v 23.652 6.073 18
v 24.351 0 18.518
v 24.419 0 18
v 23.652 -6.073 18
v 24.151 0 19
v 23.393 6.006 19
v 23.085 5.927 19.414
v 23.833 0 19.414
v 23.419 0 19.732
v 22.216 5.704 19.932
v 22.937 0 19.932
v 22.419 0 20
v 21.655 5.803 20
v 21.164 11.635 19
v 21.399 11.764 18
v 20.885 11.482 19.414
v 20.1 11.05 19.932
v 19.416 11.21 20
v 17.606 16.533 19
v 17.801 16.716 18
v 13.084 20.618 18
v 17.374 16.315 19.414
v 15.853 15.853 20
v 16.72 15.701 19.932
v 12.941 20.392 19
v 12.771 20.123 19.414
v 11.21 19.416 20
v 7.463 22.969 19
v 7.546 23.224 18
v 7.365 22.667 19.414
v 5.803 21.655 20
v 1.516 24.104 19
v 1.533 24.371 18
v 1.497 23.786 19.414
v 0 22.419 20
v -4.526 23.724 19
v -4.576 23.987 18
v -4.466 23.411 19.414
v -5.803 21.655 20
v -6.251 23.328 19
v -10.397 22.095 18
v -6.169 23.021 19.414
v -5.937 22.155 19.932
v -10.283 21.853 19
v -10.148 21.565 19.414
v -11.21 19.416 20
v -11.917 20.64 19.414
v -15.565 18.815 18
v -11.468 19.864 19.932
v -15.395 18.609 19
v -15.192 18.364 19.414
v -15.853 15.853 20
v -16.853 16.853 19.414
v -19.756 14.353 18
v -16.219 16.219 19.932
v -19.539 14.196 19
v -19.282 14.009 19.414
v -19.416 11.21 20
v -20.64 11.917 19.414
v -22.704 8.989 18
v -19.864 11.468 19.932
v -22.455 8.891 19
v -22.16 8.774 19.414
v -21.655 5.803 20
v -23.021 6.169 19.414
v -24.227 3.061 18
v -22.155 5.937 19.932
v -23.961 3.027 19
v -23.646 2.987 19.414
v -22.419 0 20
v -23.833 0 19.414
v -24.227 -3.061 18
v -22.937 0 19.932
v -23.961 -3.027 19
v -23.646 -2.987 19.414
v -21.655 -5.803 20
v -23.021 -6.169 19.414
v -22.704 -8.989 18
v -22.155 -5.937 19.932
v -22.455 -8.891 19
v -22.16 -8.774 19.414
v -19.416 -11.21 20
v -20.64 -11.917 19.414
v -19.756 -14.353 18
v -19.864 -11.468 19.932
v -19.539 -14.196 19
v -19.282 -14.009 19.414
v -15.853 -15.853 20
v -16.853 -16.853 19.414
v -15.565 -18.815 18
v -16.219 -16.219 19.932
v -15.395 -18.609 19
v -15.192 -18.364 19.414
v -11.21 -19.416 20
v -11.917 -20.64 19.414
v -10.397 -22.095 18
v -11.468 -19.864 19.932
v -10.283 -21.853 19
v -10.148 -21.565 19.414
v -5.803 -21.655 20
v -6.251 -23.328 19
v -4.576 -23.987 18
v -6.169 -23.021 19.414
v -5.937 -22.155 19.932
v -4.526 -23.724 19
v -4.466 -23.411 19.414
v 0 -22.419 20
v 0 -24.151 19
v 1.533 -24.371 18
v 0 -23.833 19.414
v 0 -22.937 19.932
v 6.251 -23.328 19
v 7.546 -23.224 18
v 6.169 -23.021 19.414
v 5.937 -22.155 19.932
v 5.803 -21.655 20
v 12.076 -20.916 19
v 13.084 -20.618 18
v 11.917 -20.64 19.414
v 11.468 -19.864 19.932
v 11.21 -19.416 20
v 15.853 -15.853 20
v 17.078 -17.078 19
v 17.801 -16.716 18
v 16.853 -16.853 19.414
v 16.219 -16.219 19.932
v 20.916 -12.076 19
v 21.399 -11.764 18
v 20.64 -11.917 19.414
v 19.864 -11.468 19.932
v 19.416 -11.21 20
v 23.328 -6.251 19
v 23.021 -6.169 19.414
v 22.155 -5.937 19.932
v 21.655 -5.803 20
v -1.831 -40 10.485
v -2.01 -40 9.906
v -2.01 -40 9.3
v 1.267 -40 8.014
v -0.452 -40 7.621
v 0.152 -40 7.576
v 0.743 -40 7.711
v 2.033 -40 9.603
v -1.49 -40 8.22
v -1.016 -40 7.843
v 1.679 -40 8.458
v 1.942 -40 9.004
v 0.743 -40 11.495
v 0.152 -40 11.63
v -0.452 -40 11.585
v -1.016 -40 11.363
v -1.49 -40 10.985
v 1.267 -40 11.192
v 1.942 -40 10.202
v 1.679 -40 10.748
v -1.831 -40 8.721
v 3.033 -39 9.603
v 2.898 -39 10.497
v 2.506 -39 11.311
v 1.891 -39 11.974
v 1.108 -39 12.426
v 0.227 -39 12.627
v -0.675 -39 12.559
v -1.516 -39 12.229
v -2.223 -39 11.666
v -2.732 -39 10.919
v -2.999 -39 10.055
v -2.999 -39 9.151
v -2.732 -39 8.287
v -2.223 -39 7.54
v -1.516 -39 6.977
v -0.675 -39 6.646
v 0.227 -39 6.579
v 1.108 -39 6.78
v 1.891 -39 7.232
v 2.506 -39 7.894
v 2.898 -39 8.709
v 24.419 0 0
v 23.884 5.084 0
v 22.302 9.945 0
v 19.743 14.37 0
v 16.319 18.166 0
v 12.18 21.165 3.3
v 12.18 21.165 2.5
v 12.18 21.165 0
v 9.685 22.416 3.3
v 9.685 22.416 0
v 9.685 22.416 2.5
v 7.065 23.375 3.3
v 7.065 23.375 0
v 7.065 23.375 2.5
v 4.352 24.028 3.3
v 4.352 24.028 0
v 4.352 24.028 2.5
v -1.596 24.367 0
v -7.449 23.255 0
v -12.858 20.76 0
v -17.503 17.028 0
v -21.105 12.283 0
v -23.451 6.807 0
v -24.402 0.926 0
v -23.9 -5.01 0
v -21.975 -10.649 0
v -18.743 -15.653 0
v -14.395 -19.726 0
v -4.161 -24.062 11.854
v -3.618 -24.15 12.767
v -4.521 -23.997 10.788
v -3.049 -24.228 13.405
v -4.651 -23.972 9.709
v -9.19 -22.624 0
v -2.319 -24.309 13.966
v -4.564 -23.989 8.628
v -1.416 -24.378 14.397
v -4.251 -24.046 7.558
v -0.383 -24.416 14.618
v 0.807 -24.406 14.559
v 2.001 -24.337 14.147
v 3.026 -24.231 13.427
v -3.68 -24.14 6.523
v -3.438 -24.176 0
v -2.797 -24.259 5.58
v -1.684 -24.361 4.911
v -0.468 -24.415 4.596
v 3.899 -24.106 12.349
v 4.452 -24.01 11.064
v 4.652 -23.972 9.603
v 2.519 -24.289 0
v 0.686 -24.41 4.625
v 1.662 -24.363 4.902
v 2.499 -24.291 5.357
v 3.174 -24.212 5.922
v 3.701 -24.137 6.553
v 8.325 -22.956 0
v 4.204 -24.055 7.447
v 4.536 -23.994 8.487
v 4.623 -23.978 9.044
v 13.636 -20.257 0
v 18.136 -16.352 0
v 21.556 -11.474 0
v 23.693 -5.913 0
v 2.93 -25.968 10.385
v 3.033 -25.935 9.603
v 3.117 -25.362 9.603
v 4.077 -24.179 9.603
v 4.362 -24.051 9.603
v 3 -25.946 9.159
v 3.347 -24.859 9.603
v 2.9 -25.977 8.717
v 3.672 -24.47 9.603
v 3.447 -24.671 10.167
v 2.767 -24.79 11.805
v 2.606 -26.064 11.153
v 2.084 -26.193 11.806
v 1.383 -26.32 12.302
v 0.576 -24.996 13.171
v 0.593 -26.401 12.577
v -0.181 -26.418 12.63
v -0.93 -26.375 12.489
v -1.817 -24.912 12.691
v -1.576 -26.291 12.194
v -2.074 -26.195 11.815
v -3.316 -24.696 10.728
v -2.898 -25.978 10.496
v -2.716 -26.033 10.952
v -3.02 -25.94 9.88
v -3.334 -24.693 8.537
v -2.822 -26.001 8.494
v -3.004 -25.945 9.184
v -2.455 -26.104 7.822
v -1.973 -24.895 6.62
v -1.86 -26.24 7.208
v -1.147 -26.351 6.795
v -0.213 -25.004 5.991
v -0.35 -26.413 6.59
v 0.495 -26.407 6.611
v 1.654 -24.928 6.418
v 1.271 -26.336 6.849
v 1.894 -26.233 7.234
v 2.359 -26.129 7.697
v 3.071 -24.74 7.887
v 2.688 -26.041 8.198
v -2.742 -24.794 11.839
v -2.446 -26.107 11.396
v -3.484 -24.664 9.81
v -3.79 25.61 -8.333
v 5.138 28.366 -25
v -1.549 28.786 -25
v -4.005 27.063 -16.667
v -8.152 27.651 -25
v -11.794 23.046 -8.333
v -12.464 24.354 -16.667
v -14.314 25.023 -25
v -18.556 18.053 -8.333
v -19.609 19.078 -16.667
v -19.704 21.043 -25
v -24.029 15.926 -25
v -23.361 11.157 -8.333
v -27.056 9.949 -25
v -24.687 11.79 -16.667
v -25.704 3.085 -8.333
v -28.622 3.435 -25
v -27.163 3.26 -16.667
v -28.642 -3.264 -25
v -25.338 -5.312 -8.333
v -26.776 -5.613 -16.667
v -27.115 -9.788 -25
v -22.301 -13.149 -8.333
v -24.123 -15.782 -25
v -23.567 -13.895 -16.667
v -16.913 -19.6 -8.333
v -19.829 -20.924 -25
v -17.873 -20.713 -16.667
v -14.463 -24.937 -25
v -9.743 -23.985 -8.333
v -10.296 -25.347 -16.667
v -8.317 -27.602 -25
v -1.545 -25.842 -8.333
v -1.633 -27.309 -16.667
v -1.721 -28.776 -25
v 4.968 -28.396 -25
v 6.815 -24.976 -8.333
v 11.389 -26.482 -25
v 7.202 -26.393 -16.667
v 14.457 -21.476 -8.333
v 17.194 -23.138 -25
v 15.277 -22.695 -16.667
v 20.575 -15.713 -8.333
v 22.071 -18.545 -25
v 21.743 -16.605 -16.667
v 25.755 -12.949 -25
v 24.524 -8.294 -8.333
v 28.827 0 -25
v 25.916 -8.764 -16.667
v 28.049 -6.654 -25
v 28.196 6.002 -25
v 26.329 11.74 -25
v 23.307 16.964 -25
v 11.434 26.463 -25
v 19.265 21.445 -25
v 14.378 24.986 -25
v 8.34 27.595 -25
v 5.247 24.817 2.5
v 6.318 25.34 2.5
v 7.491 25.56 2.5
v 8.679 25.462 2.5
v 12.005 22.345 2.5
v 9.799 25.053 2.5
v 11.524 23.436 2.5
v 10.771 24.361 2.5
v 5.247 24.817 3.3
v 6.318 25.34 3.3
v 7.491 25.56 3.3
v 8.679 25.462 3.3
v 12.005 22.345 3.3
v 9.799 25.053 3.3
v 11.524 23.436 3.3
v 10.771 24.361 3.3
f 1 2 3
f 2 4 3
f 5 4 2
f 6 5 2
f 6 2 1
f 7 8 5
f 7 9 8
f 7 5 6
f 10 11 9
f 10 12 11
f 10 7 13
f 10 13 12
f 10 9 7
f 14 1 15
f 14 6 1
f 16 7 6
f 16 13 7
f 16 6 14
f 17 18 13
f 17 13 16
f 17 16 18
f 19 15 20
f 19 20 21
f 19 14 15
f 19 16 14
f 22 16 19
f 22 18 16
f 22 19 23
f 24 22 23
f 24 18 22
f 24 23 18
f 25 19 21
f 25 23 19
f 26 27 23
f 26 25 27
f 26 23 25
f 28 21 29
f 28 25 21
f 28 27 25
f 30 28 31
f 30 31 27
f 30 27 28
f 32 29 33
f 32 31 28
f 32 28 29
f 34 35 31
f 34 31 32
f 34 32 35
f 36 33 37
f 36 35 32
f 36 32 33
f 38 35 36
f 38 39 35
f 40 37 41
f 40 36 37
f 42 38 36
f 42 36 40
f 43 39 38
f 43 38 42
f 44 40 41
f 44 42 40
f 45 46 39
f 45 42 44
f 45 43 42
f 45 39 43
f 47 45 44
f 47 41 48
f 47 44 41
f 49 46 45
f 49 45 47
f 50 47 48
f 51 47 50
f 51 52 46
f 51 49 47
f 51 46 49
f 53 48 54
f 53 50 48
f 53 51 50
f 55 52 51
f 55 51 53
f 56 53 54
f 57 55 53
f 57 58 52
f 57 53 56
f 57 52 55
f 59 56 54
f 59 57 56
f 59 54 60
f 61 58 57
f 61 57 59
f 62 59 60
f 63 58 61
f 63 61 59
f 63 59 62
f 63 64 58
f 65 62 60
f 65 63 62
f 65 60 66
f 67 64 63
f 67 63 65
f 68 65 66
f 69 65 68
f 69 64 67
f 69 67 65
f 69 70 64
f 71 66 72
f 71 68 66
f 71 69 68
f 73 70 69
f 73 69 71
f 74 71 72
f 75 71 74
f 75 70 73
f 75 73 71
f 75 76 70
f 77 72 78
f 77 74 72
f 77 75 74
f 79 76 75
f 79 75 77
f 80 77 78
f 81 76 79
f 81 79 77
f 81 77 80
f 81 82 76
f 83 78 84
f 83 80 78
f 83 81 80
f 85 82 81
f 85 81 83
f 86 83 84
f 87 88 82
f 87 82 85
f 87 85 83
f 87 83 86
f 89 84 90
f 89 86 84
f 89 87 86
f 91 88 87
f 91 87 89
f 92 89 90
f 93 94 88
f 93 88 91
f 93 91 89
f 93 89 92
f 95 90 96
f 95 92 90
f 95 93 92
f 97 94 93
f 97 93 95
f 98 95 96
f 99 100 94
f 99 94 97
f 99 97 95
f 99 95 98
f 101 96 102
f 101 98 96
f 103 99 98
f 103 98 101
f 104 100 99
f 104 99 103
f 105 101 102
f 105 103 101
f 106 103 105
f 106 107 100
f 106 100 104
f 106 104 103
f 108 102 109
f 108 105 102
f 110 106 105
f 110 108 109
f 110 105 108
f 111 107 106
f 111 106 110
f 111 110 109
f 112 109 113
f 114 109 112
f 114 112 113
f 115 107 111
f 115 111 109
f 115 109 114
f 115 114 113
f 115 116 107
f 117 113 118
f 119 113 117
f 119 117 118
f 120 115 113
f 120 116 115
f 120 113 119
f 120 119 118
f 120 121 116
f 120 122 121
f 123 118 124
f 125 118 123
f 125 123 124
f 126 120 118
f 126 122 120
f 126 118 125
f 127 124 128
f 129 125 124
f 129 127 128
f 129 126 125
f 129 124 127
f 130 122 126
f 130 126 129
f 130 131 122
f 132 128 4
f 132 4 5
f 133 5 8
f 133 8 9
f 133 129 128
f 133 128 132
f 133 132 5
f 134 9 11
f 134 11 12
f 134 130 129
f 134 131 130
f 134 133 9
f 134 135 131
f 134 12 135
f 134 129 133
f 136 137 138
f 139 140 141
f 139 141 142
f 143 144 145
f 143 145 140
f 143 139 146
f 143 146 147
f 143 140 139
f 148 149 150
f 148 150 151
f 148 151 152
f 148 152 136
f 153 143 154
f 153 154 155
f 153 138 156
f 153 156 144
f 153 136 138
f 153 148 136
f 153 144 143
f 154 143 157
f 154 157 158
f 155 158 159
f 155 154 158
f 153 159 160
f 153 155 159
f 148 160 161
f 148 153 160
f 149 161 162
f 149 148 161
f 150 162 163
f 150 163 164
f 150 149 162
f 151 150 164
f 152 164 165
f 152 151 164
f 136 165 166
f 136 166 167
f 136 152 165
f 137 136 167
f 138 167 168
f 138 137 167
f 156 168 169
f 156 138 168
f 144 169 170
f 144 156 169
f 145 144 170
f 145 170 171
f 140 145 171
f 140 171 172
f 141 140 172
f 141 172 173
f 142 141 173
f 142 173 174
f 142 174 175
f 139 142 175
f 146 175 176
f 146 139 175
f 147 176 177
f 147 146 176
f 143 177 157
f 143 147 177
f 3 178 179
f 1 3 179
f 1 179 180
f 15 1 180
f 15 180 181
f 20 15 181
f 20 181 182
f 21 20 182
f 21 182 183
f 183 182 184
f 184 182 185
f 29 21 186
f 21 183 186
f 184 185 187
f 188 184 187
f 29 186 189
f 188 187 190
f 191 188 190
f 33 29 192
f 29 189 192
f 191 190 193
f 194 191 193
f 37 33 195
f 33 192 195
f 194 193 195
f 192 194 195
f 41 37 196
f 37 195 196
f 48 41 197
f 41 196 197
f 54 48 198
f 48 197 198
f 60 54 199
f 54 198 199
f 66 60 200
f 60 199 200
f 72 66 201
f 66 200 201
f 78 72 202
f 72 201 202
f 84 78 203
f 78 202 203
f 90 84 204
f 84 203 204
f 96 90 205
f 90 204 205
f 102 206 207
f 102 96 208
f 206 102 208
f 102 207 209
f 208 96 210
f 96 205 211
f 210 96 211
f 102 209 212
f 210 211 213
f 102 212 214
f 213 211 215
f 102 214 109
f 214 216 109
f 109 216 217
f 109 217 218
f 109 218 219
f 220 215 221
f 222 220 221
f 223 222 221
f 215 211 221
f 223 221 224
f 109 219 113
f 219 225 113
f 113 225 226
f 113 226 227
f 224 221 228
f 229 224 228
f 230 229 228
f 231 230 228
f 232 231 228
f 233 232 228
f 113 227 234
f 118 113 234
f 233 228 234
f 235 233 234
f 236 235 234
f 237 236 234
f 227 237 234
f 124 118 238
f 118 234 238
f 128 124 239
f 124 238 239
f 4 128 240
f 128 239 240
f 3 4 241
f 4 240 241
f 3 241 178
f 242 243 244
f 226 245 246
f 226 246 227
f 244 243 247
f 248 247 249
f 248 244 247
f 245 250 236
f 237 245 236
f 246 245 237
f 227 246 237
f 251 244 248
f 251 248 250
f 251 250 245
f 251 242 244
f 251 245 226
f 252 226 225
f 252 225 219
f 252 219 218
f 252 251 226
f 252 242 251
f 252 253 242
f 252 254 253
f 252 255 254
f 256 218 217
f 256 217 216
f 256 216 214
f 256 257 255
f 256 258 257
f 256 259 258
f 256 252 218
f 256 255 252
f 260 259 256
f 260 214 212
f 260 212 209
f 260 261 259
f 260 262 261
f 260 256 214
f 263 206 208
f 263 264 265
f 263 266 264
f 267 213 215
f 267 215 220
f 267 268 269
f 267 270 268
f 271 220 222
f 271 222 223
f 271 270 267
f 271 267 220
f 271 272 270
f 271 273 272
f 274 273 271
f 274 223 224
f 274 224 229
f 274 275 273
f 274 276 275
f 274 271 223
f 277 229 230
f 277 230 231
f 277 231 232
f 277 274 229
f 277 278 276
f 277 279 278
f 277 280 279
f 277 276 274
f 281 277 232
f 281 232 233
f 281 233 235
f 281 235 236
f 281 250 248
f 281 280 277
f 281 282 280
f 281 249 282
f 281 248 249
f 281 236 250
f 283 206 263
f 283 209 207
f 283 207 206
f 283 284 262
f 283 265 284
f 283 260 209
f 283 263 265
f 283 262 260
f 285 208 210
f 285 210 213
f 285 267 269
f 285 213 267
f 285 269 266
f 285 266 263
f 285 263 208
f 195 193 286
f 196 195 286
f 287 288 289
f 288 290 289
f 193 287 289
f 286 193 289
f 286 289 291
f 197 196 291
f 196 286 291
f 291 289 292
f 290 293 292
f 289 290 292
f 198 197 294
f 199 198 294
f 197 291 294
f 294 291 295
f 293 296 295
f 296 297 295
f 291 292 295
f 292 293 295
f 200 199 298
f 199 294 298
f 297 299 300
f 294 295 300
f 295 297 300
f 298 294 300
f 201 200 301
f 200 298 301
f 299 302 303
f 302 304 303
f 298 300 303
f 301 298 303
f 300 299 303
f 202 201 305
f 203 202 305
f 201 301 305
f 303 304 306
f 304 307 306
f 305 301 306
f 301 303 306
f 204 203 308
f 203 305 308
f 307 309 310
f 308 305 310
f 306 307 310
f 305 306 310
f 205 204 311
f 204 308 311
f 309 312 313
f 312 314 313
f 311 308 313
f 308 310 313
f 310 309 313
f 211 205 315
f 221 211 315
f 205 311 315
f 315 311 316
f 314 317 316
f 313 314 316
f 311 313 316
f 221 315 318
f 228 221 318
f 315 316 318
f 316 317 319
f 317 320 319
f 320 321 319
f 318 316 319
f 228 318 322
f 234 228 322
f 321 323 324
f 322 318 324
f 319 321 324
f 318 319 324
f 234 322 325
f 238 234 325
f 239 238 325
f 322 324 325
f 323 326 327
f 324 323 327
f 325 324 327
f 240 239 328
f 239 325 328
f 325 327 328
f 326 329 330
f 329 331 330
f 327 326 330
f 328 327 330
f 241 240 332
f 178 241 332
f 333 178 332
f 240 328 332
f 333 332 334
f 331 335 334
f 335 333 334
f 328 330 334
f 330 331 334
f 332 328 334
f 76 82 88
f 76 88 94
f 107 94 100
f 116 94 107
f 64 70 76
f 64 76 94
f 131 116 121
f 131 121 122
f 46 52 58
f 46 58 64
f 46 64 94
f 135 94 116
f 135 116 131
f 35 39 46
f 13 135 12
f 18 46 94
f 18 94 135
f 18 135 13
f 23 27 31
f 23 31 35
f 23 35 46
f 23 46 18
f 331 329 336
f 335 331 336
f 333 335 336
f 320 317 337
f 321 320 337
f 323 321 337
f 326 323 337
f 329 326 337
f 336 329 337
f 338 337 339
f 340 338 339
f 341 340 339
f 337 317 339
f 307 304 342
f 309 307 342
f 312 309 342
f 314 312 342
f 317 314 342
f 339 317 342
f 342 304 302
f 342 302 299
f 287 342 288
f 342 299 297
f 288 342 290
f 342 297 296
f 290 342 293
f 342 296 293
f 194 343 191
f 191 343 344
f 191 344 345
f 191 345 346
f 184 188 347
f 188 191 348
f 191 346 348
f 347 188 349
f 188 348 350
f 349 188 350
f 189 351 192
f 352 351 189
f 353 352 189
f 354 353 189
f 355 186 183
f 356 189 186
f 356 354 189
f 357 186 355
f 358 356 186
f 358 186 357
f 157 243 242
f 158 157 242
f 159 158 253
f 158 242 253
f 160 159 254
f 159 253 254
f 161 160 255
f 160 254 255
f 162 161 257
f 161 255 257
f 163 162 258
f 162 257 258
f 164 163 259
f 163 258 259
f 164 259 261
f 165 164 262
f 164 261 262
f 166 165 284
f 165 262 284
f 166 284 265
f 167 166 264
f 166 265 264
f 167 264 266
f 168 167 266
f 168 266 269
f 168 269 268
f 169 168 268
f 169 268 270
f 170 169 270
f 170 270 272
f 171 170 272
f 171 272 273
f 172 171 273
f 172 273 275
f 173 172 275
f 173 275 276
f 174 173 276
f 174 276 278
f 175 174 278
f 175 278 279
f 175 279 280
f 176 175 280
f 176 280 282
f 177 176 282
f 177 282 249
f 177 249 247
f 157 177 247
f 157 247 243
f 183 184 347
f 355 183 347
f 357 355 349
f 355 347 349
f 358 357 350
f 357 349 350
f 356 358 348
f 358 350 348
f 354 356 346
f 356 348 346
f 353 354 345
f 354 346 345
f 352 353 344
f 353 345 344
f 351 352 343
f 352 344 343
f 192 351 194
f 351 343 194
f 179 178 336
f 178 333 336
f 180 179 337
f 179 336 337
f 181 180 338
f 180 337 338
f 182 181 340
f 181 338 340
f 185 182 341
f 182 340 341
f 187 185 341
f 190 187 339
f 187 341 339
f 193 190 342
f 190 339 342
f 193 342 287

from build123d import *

# Parameters (mm, degrees)
F0_R      = 24.4192579829
F1_DEPTH  = 20
F5_DEPTH  = 0.8
F6_R      = 3.0326267801
F7_DEPTH  = 40
F8_R      = 2
F9_SIZE   = 1
F10_DEPTH = 25
F10_TAPER = -10


with BuildPart() as f1:
    # F0 (on Top) → F1 (new body)
    with BuildSketch(Plane.XY):
        Circle(F0_R)
    extrude(amount=F1_DEPTH)

    # F4 (on offset) → F5 (join)
    with BuildSketch(Plane.XY.offset(2.5)):
        with BuildLine():
            ThreePointArc((4.3520725579, 24.0283088229), (8.3888871456, 22.9330925279), (12.179572853, 21.1650222196))
            ThreePointArc((12.179572853, 21.1650222196), (9.2528939627, 25.2950683106), (4.3520725579, 24.0283088229))
        make_face()
    extrude(amount=F5_DEPTH)

    # F6 (on Front) → F7 (join)
    with BuildSketch(Plane.XZ):
        with Locations((0, 9.6028381959)):
            Circle(F6_R)
    extrude(amount=F7_DEPTH)

    # F8
    f8_edges = [f1.edges().sort_by_distance(p)[0] for p in [
        (-24.419258, 0, 20),
        (-3.032627, -24.230215, 9.602838),
    ]]
    fillet(f8_edges, radius=F8_R)

    # F9
    f9_edges = [f1.edges().sort_by_distance(p)[0] for p in [
        (-3.032627, -40, 9.602838),
    ]]
    chamfer(f9_edges, length=F9_SIZE)

    # F2 (on Top) → F10 (join)
    with BuildSketch(Plane.XY):
        with BuildLine():
            ThreePointArc((4.3520725579, 24.0283088229), (-18.7426591361, -15.6528875592), (24.4192579829, 0))
            ThreePointArc((24.4192579829, 0), (21.1390195143, 12.2246478235), (12.179572853, 21.1650222196))
            ThreePointArc((12.179572853, 21.1650222196), (8.3888871456, 22.9330925279), (4.3520725579, 24.0283088229))
        make_face()
    extrude(amount=-F10_DEPTH, taper=F10_TAPER)


solid = f1.part
